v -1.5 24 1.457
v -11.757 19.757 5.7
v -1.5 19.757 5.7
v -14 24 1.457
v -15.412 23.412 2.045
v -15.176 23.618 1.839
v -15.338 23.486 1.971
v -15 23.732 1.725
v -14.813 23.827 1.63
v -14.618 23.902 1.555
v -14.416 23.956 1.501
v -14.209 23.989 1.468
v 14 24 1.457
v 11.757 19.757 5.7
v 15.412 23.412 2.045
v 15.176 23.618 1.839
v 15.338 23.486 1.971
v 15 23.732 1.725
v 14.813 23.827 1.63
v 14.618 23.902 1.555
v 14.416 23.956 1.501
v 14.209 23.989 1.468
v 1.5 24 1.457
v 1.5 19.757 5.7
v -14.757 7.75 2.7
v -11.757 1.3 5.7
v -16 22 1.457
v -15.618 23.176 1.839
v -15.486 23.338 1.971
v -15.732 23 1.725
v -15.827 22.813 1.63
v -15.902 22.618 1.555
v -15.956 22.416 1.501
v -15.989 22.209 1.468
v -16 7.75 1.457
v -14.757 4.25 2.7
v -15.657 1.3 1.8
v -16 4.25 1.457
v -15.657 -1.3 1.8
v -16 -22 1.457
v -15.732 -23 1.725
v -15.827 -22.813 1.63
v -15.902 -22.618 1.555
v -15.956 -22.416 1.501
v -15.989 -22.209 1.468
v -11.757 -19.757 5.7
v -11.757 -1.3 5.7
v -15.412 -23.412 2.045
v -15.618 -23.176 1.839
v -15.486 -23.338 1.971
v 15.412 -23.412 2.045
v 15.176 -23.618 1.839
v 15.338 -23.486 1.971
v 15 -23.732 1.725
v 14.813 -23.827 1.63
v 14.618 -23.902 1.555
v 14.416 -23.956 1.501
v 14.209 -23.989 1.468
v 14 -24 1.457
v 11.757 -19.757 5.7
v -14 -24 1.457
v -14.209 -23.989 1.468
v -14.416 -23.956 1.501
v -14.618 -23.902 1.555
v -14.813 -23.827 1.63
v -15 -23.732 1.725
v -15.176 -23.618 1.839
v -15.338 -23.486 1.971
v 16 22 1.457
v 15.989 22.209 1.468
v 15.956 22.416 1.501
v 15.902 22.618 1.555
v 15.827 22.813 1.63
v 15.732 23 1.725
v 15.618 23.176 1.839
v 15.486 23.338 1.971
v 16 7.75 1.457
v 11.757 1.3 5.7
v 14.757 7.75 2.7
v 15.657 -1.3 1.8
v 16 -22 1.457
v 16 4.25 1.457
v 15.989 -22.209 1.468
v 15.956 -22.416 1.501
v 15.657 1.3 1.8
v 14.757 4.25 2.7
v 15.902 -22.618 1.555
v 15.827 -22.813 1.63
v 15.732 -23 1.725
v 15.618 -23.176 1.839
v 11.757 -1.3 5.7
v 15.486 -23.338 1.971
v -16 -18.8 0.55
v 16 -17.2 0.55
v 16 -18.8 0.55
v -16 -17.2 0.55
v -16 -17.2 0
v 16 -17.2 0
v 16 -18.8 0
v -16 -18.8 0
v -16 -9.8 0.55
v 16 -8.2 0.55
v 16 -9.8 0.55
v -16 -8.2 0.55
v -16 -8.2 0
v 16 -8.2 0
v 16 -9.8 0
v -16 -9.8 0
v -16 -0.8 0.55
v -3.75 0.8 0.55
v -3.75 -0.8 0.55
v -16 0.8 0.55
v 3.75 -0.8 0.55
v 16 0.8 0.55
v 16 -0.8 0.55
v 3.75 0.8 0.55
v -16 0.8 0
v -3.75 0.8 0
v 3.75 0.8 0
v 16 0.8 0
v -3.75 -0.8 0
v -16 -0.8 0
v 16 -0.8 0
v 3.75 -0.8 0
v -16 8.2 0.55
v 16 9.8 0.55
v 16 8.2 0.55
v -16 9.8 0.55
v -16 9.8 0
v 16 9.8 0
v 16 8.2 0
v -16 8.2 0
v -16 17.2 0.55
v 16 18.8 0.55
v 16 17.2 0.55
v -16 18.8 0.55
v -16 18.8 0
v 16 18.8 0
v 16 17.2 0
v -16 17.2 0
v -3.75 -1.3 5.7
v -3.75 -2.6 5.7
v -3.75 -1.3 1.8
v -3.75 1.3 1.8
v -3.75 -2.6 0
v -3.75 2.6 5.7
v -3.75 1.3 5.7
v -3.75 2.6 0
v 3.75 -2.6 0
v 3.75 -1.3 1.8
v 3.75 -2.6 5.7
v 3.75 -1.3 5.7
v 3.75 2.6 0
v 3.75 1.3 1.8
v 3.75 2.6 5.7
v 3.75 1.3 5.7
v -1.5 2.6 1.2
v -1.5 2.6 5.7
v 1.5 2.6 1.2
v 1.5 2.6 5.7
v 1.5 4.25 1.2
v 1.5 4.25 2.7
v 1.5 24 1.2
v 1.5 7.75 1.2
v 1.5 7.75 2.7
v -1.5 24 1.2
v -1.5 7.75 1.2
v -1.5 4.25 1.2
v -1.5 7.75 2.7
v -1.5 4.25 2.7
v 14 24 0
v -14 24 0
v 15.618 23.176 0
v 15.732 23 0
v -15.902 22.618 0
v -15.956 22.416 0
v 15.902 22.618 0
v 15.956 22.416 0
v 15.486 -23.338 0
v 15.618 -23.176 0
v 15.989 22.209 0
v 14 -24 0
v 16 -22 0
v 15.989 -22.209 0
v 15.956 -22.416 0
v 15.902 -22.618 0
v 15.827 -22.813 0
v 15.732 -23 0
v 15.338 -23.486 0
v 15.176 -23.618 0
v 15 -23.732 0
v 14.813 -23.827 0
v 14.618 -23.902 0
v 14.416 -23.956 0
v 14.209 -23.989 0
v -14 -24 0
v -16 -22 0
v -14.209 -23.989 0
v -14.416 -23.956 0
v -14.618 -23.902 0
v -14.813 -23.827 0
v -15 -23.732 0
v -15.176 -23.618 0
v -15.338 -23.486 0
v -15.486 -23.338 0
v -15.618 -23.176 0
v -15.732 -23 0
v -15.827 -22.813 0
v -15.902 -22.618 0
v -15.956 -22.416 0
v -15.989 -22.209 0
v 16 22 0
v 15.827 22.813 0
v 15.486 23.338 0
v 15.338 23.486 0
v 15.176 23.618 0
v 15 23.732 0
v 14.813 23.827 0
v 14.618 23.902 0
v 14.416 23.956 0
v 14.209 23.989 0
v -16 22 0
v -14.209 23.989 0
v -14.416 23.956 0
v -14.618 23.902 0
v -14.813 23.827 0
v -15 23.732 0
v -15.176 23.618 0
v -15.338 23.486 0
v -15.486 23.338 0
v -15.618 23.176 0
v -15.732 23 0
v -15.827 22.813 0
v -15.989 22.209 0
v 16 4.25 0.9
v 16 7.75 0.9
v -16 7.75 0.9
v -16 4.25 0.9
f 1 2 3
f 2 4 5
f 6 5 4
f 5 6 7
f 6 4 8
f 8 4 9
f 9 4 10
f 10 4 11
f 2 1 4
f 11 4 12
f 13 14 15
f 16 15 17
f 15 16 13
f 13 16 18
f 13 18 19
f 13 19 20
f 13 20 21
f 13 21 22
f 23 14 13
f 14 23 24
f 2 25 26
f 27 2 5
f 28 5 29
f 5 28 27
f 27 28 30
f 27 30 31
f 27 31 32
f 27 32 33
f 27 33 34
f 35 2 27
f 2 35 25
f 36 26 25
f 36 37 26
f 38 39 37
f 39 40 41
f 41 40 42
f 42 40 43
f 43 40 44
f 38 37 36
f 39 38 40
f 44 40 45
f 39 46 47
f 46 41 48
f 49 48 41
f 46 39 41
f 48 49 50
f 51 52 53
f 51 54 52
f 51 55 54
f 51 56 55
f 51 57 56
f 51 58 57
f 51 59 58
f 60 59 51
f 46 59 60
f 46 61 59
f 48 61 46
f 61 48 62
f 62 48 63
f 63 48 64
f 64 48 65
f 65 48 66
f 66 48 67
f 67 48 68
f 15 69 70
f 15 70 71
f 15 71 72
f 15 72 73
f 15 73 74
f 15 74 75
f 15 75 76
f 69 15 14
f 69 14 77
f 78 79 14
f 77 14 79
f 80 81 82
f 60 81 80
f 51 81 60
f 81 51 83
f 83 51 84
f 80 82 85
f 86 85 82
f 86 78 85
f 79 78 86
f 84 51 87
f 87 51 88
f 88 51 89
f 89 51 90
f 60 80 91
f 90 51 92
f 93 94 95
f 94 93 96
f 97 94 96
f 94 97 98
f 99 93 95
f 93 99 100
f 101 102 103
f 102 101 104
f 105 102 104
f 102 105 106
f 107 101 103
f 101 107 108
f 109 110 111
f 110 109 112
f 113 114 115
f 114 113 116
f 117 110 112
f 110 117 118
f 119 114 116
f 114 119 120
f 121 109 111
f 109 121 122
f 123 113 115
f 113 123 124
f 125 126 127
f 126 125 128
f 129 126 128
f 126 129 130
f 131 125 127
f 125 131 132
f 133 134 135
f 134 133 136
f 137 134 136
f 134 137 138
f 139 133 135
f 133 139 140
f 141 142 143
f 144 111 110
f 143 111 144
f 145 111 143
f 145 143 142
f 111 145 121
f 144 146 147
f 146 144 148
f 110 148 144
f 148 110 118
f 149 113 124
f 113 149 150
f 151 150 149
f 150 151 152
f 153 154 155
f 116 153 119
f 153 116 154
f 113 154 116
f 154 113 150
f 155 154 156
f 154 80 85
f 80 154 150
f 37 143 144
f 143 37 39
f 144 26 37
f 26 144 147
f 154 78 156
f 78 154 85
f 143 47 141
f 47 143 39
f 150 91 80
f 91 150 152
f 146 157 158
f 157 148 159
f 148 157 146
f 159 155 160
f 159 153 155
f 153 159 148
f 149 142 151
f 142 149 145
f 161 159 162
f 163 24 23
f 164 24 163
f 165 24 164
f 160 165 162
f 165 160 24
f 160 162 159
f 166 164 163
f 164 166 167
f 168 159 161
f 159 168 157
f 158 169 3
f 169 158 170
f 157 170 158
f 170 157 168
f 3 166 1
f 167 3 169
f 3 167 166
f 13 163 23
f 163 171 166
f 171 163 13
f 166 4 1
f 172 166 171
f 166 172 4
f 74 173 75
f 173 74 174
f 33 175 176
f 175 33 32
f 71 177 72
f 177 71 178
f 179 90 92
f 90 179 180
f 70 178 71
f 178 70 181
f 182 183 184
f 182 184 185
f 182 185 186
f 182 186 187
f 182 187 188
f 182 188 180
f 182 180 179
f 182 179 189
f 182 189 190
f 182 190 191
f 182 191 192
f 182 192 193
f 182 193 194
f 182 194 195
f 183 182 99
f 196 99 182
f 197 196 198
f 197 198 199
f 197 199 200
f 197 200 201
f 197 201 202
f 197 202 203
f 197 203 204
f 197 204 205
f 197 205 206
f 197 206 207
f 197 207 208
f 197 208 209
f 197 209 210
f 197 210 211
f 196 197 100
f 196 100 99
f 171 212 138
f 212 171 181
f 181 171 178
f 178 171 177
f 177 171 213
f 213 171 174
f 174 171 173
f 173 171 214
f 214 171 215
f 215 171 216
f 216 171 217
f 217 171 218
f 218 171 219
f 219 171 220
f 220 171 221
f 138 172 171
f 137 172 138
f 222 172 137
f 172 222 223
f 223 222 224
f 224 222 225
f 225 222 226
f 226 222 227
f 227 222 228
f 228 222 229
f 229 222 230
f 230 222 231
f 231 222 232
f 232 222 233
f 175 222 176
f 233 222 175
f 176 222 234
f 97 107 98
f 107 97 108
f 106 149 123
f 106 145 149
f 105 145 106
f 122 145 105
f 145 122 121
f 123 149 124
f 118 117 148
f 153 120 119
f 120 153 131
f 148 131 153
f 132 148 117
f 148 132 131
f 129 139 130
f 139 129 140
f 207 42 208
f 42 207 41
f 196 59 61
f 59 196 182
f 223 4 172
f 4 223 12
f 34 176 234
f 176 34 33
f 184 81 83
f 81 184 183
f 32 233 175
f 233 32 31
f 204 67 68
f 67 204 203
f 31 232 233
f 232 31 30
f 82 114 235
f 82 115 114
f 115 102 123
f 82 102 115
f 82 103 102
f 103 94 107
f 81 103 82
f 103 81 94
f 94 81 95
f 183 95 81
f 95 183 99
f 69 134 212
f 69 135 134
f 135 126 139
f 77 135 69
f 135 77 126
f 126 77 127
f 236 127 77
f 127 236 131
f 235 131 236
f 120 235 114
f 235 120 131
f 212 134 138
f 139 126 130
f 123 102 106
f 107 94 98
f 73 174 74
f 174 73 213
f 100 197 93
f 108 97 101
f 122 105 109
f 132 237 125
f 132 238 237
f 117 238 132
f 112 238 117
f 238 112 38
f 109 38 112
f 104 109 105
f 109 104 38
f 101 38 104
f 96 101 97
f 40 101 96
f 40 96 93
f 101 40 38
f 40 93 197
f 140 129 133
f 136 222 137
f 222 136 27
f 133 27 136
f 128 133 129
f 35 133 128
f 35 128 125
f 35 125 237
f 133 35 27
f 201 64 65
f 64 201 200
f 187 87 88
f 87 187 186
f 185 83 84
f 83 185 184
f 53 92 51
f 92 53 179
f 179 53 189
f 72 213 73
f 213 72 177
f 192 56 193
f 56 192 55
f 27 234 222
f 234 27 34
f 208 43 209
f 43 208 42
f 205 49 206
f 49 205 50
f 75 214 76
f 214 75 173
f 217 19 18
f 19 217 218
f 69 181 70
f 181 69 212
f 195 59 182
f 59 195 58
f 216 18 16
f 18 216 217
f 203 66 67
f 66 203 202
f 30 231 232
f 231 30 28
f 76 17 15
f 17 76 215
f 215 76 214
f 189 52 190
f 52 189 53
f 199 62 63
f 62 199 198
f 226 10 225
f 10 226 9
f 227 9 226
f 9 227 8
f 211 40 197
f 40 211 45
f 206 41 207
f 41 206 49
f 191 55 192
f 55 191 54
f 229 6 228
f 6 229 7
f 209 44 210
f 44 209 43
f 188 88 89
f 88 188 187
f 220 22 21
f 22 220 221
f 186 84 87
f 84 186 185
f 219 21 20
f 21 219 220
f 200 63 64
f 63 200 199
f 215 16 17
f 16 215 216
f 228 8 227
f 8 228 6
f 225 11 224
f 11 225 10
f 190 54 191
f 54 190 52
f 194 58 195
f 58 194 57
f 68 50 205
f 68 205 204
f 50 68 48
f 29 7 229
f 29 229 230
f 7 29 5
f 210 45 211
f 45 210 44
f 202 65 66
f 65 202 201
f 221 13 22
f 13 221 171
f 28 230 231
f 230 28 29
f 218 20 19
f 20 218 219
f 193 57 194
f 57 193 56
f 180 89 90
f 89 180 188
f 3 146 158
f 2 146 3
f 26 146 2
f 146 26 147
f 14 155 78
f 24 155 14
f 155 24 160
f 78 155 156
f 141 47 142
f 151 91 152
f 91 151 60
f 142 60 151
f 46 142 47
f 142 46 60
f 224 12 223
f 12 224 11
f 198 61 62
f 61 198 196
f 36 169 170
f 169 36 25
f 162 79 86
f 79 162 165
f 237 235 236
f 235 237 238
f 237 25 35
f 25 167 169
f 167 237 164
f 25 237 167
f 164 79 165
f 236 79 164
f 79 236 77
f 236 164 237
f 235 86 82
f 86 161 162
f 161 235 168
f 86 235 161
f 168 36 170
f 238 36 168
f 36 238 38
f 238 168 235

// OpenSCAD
// =============================================================================
// PROJECT: FIXED-WING OMNI-AERO ELRS MOUNT
// VERSION: 1.2 (4-Way Chamfer & Educational Comments)
// DESCRIPTION: A glue-on horizontal mount with all-around aerodynamic 
//              smoothing and recessed channels for ELRS antennas.
// =============================================================================

/* [1. BASE PLATE SETTINGS] */

// Total footprint width
base_w          = 32.0;  
// Total footprint length
base_l          = 48.0;  
// The flexible "hinge" layer (gluing surface)
base_thick      = 1.2;   
// The padded block that holds the antenna
pad_thick       = 4.5;   
// Relief cuts that allow the TPU to curve around a wing
slot_width      = 1.6;   

/* [2. ANTENNA HARDWARE SPECS] */

wire_dia        = 2.6;   
junction_dia    = 5.2;   
junction_l      = 7.5;   
feedline_dia    = 3.0;   
total_span      = 36.0;  

/* [3. RETENTION & AERO] */

ziptie_width    = 3.5;   
ziptie_thick    = 1.8; 
// Moves the zip-tie back to clamp the coax, not the dipoles
ziptie_offset   = 6.0;  
// Size of the aerodynamic ramps on all sides
aero_chamfer    = 3.0;

/* [4. INTERNAL CALCULATIONS] */

$fn = 60;
total_h = base_thick + pad_thick;

// =============================================================================
// MAIN ASSEMBLY
// =============================================================================

difference() {
    
    // --- STEP 1: THE SOLID BODY ---
    union() {
        // We start with a rounded block using the 'hull' of four cylinders.
        hull() {
            for(x=[-1,1], y=[-1,1]) {
                translate([x * (base_w/2 - 2), y * (base_l/2 - 2), 0])
                    cylinder(h=total_h, r=2);
            }
        }
    }

    // --- STEP 2: THE SUBTRACTIONS (The "Machining" Phase) ---

    // A. OMNI-DIRECTIONAL CHAMFERING
    // This 'for' loop rotates a cutting cube to shave all four edges.
    for(angle=[0, 90, 180, 270]) rotate([0, 0, angle]) {
        // We pick the distance based on whether we are cutting the side or end
        dist = (angle == 0 || angle == 180) ? base_l/2 : base_w/2;
        
        translate([0, dist, total_h])
            rotate([45, 0, 0])
                cube([max(base_w, base_l) + 10, aero_chamfer * 2, aero_chamfer * 2], center=true);
    }

    // B. FLEX RELIEF SLOTS (The "Tank Tread")
    // These only cut through the bottom 1.2mm membrane.
    for(i = [-base_l/2 + 6 : 9 : base_l/2 - 6]) {
        translate([0, i, -0.1])
            cube([base_w + 2, slot_width, base_thick + 0.1], center=true);
    }

    // C. THE ANTENNA CHANNELS (Milled into the top)
    translate([0, 0, total_h]) {
        
        // 1. Dipole Arms (Horizontal Bar)
        rotate([0, 90, 0])
            cylinder(h=total_span, d=wire_dia, center=true);
            
        // 2. T-Junction (The Center Node)
        rotate([0, 90, 0])
            cylinder(h=junction_l, d=junction_dia, center=true);
            
        // 3. Feedline Channel (The Tail)
        translate([0, base_l/4, 0])
            rotate([90, 0, 0])
                cylinder(h=base_l/2 + 2, d=feedline_dia, center=true);
                
        // 4. Snap-Fit Entry Slots (Top Access)
        cube([total_span, wire_dia, wire_dia * 3], center=true);
        cube([junction_l, junction_dia, junction_dia * 3], center=true);
        translate([0, base_l/4, 0])
            cube([feedline_dia, base_l/2, feedline_dia * 3], center=true);
    }

    // D. OFFSET ZIP-TIE TRENCH
    // This is carved into the 'floor' of the channels.
    translate([0, ziptie_offset, total_h - feedline_dia - ziptie_thick/2])
        cube([base_w + 2, ziptie_width, ziptie_thick], center=true);
}
